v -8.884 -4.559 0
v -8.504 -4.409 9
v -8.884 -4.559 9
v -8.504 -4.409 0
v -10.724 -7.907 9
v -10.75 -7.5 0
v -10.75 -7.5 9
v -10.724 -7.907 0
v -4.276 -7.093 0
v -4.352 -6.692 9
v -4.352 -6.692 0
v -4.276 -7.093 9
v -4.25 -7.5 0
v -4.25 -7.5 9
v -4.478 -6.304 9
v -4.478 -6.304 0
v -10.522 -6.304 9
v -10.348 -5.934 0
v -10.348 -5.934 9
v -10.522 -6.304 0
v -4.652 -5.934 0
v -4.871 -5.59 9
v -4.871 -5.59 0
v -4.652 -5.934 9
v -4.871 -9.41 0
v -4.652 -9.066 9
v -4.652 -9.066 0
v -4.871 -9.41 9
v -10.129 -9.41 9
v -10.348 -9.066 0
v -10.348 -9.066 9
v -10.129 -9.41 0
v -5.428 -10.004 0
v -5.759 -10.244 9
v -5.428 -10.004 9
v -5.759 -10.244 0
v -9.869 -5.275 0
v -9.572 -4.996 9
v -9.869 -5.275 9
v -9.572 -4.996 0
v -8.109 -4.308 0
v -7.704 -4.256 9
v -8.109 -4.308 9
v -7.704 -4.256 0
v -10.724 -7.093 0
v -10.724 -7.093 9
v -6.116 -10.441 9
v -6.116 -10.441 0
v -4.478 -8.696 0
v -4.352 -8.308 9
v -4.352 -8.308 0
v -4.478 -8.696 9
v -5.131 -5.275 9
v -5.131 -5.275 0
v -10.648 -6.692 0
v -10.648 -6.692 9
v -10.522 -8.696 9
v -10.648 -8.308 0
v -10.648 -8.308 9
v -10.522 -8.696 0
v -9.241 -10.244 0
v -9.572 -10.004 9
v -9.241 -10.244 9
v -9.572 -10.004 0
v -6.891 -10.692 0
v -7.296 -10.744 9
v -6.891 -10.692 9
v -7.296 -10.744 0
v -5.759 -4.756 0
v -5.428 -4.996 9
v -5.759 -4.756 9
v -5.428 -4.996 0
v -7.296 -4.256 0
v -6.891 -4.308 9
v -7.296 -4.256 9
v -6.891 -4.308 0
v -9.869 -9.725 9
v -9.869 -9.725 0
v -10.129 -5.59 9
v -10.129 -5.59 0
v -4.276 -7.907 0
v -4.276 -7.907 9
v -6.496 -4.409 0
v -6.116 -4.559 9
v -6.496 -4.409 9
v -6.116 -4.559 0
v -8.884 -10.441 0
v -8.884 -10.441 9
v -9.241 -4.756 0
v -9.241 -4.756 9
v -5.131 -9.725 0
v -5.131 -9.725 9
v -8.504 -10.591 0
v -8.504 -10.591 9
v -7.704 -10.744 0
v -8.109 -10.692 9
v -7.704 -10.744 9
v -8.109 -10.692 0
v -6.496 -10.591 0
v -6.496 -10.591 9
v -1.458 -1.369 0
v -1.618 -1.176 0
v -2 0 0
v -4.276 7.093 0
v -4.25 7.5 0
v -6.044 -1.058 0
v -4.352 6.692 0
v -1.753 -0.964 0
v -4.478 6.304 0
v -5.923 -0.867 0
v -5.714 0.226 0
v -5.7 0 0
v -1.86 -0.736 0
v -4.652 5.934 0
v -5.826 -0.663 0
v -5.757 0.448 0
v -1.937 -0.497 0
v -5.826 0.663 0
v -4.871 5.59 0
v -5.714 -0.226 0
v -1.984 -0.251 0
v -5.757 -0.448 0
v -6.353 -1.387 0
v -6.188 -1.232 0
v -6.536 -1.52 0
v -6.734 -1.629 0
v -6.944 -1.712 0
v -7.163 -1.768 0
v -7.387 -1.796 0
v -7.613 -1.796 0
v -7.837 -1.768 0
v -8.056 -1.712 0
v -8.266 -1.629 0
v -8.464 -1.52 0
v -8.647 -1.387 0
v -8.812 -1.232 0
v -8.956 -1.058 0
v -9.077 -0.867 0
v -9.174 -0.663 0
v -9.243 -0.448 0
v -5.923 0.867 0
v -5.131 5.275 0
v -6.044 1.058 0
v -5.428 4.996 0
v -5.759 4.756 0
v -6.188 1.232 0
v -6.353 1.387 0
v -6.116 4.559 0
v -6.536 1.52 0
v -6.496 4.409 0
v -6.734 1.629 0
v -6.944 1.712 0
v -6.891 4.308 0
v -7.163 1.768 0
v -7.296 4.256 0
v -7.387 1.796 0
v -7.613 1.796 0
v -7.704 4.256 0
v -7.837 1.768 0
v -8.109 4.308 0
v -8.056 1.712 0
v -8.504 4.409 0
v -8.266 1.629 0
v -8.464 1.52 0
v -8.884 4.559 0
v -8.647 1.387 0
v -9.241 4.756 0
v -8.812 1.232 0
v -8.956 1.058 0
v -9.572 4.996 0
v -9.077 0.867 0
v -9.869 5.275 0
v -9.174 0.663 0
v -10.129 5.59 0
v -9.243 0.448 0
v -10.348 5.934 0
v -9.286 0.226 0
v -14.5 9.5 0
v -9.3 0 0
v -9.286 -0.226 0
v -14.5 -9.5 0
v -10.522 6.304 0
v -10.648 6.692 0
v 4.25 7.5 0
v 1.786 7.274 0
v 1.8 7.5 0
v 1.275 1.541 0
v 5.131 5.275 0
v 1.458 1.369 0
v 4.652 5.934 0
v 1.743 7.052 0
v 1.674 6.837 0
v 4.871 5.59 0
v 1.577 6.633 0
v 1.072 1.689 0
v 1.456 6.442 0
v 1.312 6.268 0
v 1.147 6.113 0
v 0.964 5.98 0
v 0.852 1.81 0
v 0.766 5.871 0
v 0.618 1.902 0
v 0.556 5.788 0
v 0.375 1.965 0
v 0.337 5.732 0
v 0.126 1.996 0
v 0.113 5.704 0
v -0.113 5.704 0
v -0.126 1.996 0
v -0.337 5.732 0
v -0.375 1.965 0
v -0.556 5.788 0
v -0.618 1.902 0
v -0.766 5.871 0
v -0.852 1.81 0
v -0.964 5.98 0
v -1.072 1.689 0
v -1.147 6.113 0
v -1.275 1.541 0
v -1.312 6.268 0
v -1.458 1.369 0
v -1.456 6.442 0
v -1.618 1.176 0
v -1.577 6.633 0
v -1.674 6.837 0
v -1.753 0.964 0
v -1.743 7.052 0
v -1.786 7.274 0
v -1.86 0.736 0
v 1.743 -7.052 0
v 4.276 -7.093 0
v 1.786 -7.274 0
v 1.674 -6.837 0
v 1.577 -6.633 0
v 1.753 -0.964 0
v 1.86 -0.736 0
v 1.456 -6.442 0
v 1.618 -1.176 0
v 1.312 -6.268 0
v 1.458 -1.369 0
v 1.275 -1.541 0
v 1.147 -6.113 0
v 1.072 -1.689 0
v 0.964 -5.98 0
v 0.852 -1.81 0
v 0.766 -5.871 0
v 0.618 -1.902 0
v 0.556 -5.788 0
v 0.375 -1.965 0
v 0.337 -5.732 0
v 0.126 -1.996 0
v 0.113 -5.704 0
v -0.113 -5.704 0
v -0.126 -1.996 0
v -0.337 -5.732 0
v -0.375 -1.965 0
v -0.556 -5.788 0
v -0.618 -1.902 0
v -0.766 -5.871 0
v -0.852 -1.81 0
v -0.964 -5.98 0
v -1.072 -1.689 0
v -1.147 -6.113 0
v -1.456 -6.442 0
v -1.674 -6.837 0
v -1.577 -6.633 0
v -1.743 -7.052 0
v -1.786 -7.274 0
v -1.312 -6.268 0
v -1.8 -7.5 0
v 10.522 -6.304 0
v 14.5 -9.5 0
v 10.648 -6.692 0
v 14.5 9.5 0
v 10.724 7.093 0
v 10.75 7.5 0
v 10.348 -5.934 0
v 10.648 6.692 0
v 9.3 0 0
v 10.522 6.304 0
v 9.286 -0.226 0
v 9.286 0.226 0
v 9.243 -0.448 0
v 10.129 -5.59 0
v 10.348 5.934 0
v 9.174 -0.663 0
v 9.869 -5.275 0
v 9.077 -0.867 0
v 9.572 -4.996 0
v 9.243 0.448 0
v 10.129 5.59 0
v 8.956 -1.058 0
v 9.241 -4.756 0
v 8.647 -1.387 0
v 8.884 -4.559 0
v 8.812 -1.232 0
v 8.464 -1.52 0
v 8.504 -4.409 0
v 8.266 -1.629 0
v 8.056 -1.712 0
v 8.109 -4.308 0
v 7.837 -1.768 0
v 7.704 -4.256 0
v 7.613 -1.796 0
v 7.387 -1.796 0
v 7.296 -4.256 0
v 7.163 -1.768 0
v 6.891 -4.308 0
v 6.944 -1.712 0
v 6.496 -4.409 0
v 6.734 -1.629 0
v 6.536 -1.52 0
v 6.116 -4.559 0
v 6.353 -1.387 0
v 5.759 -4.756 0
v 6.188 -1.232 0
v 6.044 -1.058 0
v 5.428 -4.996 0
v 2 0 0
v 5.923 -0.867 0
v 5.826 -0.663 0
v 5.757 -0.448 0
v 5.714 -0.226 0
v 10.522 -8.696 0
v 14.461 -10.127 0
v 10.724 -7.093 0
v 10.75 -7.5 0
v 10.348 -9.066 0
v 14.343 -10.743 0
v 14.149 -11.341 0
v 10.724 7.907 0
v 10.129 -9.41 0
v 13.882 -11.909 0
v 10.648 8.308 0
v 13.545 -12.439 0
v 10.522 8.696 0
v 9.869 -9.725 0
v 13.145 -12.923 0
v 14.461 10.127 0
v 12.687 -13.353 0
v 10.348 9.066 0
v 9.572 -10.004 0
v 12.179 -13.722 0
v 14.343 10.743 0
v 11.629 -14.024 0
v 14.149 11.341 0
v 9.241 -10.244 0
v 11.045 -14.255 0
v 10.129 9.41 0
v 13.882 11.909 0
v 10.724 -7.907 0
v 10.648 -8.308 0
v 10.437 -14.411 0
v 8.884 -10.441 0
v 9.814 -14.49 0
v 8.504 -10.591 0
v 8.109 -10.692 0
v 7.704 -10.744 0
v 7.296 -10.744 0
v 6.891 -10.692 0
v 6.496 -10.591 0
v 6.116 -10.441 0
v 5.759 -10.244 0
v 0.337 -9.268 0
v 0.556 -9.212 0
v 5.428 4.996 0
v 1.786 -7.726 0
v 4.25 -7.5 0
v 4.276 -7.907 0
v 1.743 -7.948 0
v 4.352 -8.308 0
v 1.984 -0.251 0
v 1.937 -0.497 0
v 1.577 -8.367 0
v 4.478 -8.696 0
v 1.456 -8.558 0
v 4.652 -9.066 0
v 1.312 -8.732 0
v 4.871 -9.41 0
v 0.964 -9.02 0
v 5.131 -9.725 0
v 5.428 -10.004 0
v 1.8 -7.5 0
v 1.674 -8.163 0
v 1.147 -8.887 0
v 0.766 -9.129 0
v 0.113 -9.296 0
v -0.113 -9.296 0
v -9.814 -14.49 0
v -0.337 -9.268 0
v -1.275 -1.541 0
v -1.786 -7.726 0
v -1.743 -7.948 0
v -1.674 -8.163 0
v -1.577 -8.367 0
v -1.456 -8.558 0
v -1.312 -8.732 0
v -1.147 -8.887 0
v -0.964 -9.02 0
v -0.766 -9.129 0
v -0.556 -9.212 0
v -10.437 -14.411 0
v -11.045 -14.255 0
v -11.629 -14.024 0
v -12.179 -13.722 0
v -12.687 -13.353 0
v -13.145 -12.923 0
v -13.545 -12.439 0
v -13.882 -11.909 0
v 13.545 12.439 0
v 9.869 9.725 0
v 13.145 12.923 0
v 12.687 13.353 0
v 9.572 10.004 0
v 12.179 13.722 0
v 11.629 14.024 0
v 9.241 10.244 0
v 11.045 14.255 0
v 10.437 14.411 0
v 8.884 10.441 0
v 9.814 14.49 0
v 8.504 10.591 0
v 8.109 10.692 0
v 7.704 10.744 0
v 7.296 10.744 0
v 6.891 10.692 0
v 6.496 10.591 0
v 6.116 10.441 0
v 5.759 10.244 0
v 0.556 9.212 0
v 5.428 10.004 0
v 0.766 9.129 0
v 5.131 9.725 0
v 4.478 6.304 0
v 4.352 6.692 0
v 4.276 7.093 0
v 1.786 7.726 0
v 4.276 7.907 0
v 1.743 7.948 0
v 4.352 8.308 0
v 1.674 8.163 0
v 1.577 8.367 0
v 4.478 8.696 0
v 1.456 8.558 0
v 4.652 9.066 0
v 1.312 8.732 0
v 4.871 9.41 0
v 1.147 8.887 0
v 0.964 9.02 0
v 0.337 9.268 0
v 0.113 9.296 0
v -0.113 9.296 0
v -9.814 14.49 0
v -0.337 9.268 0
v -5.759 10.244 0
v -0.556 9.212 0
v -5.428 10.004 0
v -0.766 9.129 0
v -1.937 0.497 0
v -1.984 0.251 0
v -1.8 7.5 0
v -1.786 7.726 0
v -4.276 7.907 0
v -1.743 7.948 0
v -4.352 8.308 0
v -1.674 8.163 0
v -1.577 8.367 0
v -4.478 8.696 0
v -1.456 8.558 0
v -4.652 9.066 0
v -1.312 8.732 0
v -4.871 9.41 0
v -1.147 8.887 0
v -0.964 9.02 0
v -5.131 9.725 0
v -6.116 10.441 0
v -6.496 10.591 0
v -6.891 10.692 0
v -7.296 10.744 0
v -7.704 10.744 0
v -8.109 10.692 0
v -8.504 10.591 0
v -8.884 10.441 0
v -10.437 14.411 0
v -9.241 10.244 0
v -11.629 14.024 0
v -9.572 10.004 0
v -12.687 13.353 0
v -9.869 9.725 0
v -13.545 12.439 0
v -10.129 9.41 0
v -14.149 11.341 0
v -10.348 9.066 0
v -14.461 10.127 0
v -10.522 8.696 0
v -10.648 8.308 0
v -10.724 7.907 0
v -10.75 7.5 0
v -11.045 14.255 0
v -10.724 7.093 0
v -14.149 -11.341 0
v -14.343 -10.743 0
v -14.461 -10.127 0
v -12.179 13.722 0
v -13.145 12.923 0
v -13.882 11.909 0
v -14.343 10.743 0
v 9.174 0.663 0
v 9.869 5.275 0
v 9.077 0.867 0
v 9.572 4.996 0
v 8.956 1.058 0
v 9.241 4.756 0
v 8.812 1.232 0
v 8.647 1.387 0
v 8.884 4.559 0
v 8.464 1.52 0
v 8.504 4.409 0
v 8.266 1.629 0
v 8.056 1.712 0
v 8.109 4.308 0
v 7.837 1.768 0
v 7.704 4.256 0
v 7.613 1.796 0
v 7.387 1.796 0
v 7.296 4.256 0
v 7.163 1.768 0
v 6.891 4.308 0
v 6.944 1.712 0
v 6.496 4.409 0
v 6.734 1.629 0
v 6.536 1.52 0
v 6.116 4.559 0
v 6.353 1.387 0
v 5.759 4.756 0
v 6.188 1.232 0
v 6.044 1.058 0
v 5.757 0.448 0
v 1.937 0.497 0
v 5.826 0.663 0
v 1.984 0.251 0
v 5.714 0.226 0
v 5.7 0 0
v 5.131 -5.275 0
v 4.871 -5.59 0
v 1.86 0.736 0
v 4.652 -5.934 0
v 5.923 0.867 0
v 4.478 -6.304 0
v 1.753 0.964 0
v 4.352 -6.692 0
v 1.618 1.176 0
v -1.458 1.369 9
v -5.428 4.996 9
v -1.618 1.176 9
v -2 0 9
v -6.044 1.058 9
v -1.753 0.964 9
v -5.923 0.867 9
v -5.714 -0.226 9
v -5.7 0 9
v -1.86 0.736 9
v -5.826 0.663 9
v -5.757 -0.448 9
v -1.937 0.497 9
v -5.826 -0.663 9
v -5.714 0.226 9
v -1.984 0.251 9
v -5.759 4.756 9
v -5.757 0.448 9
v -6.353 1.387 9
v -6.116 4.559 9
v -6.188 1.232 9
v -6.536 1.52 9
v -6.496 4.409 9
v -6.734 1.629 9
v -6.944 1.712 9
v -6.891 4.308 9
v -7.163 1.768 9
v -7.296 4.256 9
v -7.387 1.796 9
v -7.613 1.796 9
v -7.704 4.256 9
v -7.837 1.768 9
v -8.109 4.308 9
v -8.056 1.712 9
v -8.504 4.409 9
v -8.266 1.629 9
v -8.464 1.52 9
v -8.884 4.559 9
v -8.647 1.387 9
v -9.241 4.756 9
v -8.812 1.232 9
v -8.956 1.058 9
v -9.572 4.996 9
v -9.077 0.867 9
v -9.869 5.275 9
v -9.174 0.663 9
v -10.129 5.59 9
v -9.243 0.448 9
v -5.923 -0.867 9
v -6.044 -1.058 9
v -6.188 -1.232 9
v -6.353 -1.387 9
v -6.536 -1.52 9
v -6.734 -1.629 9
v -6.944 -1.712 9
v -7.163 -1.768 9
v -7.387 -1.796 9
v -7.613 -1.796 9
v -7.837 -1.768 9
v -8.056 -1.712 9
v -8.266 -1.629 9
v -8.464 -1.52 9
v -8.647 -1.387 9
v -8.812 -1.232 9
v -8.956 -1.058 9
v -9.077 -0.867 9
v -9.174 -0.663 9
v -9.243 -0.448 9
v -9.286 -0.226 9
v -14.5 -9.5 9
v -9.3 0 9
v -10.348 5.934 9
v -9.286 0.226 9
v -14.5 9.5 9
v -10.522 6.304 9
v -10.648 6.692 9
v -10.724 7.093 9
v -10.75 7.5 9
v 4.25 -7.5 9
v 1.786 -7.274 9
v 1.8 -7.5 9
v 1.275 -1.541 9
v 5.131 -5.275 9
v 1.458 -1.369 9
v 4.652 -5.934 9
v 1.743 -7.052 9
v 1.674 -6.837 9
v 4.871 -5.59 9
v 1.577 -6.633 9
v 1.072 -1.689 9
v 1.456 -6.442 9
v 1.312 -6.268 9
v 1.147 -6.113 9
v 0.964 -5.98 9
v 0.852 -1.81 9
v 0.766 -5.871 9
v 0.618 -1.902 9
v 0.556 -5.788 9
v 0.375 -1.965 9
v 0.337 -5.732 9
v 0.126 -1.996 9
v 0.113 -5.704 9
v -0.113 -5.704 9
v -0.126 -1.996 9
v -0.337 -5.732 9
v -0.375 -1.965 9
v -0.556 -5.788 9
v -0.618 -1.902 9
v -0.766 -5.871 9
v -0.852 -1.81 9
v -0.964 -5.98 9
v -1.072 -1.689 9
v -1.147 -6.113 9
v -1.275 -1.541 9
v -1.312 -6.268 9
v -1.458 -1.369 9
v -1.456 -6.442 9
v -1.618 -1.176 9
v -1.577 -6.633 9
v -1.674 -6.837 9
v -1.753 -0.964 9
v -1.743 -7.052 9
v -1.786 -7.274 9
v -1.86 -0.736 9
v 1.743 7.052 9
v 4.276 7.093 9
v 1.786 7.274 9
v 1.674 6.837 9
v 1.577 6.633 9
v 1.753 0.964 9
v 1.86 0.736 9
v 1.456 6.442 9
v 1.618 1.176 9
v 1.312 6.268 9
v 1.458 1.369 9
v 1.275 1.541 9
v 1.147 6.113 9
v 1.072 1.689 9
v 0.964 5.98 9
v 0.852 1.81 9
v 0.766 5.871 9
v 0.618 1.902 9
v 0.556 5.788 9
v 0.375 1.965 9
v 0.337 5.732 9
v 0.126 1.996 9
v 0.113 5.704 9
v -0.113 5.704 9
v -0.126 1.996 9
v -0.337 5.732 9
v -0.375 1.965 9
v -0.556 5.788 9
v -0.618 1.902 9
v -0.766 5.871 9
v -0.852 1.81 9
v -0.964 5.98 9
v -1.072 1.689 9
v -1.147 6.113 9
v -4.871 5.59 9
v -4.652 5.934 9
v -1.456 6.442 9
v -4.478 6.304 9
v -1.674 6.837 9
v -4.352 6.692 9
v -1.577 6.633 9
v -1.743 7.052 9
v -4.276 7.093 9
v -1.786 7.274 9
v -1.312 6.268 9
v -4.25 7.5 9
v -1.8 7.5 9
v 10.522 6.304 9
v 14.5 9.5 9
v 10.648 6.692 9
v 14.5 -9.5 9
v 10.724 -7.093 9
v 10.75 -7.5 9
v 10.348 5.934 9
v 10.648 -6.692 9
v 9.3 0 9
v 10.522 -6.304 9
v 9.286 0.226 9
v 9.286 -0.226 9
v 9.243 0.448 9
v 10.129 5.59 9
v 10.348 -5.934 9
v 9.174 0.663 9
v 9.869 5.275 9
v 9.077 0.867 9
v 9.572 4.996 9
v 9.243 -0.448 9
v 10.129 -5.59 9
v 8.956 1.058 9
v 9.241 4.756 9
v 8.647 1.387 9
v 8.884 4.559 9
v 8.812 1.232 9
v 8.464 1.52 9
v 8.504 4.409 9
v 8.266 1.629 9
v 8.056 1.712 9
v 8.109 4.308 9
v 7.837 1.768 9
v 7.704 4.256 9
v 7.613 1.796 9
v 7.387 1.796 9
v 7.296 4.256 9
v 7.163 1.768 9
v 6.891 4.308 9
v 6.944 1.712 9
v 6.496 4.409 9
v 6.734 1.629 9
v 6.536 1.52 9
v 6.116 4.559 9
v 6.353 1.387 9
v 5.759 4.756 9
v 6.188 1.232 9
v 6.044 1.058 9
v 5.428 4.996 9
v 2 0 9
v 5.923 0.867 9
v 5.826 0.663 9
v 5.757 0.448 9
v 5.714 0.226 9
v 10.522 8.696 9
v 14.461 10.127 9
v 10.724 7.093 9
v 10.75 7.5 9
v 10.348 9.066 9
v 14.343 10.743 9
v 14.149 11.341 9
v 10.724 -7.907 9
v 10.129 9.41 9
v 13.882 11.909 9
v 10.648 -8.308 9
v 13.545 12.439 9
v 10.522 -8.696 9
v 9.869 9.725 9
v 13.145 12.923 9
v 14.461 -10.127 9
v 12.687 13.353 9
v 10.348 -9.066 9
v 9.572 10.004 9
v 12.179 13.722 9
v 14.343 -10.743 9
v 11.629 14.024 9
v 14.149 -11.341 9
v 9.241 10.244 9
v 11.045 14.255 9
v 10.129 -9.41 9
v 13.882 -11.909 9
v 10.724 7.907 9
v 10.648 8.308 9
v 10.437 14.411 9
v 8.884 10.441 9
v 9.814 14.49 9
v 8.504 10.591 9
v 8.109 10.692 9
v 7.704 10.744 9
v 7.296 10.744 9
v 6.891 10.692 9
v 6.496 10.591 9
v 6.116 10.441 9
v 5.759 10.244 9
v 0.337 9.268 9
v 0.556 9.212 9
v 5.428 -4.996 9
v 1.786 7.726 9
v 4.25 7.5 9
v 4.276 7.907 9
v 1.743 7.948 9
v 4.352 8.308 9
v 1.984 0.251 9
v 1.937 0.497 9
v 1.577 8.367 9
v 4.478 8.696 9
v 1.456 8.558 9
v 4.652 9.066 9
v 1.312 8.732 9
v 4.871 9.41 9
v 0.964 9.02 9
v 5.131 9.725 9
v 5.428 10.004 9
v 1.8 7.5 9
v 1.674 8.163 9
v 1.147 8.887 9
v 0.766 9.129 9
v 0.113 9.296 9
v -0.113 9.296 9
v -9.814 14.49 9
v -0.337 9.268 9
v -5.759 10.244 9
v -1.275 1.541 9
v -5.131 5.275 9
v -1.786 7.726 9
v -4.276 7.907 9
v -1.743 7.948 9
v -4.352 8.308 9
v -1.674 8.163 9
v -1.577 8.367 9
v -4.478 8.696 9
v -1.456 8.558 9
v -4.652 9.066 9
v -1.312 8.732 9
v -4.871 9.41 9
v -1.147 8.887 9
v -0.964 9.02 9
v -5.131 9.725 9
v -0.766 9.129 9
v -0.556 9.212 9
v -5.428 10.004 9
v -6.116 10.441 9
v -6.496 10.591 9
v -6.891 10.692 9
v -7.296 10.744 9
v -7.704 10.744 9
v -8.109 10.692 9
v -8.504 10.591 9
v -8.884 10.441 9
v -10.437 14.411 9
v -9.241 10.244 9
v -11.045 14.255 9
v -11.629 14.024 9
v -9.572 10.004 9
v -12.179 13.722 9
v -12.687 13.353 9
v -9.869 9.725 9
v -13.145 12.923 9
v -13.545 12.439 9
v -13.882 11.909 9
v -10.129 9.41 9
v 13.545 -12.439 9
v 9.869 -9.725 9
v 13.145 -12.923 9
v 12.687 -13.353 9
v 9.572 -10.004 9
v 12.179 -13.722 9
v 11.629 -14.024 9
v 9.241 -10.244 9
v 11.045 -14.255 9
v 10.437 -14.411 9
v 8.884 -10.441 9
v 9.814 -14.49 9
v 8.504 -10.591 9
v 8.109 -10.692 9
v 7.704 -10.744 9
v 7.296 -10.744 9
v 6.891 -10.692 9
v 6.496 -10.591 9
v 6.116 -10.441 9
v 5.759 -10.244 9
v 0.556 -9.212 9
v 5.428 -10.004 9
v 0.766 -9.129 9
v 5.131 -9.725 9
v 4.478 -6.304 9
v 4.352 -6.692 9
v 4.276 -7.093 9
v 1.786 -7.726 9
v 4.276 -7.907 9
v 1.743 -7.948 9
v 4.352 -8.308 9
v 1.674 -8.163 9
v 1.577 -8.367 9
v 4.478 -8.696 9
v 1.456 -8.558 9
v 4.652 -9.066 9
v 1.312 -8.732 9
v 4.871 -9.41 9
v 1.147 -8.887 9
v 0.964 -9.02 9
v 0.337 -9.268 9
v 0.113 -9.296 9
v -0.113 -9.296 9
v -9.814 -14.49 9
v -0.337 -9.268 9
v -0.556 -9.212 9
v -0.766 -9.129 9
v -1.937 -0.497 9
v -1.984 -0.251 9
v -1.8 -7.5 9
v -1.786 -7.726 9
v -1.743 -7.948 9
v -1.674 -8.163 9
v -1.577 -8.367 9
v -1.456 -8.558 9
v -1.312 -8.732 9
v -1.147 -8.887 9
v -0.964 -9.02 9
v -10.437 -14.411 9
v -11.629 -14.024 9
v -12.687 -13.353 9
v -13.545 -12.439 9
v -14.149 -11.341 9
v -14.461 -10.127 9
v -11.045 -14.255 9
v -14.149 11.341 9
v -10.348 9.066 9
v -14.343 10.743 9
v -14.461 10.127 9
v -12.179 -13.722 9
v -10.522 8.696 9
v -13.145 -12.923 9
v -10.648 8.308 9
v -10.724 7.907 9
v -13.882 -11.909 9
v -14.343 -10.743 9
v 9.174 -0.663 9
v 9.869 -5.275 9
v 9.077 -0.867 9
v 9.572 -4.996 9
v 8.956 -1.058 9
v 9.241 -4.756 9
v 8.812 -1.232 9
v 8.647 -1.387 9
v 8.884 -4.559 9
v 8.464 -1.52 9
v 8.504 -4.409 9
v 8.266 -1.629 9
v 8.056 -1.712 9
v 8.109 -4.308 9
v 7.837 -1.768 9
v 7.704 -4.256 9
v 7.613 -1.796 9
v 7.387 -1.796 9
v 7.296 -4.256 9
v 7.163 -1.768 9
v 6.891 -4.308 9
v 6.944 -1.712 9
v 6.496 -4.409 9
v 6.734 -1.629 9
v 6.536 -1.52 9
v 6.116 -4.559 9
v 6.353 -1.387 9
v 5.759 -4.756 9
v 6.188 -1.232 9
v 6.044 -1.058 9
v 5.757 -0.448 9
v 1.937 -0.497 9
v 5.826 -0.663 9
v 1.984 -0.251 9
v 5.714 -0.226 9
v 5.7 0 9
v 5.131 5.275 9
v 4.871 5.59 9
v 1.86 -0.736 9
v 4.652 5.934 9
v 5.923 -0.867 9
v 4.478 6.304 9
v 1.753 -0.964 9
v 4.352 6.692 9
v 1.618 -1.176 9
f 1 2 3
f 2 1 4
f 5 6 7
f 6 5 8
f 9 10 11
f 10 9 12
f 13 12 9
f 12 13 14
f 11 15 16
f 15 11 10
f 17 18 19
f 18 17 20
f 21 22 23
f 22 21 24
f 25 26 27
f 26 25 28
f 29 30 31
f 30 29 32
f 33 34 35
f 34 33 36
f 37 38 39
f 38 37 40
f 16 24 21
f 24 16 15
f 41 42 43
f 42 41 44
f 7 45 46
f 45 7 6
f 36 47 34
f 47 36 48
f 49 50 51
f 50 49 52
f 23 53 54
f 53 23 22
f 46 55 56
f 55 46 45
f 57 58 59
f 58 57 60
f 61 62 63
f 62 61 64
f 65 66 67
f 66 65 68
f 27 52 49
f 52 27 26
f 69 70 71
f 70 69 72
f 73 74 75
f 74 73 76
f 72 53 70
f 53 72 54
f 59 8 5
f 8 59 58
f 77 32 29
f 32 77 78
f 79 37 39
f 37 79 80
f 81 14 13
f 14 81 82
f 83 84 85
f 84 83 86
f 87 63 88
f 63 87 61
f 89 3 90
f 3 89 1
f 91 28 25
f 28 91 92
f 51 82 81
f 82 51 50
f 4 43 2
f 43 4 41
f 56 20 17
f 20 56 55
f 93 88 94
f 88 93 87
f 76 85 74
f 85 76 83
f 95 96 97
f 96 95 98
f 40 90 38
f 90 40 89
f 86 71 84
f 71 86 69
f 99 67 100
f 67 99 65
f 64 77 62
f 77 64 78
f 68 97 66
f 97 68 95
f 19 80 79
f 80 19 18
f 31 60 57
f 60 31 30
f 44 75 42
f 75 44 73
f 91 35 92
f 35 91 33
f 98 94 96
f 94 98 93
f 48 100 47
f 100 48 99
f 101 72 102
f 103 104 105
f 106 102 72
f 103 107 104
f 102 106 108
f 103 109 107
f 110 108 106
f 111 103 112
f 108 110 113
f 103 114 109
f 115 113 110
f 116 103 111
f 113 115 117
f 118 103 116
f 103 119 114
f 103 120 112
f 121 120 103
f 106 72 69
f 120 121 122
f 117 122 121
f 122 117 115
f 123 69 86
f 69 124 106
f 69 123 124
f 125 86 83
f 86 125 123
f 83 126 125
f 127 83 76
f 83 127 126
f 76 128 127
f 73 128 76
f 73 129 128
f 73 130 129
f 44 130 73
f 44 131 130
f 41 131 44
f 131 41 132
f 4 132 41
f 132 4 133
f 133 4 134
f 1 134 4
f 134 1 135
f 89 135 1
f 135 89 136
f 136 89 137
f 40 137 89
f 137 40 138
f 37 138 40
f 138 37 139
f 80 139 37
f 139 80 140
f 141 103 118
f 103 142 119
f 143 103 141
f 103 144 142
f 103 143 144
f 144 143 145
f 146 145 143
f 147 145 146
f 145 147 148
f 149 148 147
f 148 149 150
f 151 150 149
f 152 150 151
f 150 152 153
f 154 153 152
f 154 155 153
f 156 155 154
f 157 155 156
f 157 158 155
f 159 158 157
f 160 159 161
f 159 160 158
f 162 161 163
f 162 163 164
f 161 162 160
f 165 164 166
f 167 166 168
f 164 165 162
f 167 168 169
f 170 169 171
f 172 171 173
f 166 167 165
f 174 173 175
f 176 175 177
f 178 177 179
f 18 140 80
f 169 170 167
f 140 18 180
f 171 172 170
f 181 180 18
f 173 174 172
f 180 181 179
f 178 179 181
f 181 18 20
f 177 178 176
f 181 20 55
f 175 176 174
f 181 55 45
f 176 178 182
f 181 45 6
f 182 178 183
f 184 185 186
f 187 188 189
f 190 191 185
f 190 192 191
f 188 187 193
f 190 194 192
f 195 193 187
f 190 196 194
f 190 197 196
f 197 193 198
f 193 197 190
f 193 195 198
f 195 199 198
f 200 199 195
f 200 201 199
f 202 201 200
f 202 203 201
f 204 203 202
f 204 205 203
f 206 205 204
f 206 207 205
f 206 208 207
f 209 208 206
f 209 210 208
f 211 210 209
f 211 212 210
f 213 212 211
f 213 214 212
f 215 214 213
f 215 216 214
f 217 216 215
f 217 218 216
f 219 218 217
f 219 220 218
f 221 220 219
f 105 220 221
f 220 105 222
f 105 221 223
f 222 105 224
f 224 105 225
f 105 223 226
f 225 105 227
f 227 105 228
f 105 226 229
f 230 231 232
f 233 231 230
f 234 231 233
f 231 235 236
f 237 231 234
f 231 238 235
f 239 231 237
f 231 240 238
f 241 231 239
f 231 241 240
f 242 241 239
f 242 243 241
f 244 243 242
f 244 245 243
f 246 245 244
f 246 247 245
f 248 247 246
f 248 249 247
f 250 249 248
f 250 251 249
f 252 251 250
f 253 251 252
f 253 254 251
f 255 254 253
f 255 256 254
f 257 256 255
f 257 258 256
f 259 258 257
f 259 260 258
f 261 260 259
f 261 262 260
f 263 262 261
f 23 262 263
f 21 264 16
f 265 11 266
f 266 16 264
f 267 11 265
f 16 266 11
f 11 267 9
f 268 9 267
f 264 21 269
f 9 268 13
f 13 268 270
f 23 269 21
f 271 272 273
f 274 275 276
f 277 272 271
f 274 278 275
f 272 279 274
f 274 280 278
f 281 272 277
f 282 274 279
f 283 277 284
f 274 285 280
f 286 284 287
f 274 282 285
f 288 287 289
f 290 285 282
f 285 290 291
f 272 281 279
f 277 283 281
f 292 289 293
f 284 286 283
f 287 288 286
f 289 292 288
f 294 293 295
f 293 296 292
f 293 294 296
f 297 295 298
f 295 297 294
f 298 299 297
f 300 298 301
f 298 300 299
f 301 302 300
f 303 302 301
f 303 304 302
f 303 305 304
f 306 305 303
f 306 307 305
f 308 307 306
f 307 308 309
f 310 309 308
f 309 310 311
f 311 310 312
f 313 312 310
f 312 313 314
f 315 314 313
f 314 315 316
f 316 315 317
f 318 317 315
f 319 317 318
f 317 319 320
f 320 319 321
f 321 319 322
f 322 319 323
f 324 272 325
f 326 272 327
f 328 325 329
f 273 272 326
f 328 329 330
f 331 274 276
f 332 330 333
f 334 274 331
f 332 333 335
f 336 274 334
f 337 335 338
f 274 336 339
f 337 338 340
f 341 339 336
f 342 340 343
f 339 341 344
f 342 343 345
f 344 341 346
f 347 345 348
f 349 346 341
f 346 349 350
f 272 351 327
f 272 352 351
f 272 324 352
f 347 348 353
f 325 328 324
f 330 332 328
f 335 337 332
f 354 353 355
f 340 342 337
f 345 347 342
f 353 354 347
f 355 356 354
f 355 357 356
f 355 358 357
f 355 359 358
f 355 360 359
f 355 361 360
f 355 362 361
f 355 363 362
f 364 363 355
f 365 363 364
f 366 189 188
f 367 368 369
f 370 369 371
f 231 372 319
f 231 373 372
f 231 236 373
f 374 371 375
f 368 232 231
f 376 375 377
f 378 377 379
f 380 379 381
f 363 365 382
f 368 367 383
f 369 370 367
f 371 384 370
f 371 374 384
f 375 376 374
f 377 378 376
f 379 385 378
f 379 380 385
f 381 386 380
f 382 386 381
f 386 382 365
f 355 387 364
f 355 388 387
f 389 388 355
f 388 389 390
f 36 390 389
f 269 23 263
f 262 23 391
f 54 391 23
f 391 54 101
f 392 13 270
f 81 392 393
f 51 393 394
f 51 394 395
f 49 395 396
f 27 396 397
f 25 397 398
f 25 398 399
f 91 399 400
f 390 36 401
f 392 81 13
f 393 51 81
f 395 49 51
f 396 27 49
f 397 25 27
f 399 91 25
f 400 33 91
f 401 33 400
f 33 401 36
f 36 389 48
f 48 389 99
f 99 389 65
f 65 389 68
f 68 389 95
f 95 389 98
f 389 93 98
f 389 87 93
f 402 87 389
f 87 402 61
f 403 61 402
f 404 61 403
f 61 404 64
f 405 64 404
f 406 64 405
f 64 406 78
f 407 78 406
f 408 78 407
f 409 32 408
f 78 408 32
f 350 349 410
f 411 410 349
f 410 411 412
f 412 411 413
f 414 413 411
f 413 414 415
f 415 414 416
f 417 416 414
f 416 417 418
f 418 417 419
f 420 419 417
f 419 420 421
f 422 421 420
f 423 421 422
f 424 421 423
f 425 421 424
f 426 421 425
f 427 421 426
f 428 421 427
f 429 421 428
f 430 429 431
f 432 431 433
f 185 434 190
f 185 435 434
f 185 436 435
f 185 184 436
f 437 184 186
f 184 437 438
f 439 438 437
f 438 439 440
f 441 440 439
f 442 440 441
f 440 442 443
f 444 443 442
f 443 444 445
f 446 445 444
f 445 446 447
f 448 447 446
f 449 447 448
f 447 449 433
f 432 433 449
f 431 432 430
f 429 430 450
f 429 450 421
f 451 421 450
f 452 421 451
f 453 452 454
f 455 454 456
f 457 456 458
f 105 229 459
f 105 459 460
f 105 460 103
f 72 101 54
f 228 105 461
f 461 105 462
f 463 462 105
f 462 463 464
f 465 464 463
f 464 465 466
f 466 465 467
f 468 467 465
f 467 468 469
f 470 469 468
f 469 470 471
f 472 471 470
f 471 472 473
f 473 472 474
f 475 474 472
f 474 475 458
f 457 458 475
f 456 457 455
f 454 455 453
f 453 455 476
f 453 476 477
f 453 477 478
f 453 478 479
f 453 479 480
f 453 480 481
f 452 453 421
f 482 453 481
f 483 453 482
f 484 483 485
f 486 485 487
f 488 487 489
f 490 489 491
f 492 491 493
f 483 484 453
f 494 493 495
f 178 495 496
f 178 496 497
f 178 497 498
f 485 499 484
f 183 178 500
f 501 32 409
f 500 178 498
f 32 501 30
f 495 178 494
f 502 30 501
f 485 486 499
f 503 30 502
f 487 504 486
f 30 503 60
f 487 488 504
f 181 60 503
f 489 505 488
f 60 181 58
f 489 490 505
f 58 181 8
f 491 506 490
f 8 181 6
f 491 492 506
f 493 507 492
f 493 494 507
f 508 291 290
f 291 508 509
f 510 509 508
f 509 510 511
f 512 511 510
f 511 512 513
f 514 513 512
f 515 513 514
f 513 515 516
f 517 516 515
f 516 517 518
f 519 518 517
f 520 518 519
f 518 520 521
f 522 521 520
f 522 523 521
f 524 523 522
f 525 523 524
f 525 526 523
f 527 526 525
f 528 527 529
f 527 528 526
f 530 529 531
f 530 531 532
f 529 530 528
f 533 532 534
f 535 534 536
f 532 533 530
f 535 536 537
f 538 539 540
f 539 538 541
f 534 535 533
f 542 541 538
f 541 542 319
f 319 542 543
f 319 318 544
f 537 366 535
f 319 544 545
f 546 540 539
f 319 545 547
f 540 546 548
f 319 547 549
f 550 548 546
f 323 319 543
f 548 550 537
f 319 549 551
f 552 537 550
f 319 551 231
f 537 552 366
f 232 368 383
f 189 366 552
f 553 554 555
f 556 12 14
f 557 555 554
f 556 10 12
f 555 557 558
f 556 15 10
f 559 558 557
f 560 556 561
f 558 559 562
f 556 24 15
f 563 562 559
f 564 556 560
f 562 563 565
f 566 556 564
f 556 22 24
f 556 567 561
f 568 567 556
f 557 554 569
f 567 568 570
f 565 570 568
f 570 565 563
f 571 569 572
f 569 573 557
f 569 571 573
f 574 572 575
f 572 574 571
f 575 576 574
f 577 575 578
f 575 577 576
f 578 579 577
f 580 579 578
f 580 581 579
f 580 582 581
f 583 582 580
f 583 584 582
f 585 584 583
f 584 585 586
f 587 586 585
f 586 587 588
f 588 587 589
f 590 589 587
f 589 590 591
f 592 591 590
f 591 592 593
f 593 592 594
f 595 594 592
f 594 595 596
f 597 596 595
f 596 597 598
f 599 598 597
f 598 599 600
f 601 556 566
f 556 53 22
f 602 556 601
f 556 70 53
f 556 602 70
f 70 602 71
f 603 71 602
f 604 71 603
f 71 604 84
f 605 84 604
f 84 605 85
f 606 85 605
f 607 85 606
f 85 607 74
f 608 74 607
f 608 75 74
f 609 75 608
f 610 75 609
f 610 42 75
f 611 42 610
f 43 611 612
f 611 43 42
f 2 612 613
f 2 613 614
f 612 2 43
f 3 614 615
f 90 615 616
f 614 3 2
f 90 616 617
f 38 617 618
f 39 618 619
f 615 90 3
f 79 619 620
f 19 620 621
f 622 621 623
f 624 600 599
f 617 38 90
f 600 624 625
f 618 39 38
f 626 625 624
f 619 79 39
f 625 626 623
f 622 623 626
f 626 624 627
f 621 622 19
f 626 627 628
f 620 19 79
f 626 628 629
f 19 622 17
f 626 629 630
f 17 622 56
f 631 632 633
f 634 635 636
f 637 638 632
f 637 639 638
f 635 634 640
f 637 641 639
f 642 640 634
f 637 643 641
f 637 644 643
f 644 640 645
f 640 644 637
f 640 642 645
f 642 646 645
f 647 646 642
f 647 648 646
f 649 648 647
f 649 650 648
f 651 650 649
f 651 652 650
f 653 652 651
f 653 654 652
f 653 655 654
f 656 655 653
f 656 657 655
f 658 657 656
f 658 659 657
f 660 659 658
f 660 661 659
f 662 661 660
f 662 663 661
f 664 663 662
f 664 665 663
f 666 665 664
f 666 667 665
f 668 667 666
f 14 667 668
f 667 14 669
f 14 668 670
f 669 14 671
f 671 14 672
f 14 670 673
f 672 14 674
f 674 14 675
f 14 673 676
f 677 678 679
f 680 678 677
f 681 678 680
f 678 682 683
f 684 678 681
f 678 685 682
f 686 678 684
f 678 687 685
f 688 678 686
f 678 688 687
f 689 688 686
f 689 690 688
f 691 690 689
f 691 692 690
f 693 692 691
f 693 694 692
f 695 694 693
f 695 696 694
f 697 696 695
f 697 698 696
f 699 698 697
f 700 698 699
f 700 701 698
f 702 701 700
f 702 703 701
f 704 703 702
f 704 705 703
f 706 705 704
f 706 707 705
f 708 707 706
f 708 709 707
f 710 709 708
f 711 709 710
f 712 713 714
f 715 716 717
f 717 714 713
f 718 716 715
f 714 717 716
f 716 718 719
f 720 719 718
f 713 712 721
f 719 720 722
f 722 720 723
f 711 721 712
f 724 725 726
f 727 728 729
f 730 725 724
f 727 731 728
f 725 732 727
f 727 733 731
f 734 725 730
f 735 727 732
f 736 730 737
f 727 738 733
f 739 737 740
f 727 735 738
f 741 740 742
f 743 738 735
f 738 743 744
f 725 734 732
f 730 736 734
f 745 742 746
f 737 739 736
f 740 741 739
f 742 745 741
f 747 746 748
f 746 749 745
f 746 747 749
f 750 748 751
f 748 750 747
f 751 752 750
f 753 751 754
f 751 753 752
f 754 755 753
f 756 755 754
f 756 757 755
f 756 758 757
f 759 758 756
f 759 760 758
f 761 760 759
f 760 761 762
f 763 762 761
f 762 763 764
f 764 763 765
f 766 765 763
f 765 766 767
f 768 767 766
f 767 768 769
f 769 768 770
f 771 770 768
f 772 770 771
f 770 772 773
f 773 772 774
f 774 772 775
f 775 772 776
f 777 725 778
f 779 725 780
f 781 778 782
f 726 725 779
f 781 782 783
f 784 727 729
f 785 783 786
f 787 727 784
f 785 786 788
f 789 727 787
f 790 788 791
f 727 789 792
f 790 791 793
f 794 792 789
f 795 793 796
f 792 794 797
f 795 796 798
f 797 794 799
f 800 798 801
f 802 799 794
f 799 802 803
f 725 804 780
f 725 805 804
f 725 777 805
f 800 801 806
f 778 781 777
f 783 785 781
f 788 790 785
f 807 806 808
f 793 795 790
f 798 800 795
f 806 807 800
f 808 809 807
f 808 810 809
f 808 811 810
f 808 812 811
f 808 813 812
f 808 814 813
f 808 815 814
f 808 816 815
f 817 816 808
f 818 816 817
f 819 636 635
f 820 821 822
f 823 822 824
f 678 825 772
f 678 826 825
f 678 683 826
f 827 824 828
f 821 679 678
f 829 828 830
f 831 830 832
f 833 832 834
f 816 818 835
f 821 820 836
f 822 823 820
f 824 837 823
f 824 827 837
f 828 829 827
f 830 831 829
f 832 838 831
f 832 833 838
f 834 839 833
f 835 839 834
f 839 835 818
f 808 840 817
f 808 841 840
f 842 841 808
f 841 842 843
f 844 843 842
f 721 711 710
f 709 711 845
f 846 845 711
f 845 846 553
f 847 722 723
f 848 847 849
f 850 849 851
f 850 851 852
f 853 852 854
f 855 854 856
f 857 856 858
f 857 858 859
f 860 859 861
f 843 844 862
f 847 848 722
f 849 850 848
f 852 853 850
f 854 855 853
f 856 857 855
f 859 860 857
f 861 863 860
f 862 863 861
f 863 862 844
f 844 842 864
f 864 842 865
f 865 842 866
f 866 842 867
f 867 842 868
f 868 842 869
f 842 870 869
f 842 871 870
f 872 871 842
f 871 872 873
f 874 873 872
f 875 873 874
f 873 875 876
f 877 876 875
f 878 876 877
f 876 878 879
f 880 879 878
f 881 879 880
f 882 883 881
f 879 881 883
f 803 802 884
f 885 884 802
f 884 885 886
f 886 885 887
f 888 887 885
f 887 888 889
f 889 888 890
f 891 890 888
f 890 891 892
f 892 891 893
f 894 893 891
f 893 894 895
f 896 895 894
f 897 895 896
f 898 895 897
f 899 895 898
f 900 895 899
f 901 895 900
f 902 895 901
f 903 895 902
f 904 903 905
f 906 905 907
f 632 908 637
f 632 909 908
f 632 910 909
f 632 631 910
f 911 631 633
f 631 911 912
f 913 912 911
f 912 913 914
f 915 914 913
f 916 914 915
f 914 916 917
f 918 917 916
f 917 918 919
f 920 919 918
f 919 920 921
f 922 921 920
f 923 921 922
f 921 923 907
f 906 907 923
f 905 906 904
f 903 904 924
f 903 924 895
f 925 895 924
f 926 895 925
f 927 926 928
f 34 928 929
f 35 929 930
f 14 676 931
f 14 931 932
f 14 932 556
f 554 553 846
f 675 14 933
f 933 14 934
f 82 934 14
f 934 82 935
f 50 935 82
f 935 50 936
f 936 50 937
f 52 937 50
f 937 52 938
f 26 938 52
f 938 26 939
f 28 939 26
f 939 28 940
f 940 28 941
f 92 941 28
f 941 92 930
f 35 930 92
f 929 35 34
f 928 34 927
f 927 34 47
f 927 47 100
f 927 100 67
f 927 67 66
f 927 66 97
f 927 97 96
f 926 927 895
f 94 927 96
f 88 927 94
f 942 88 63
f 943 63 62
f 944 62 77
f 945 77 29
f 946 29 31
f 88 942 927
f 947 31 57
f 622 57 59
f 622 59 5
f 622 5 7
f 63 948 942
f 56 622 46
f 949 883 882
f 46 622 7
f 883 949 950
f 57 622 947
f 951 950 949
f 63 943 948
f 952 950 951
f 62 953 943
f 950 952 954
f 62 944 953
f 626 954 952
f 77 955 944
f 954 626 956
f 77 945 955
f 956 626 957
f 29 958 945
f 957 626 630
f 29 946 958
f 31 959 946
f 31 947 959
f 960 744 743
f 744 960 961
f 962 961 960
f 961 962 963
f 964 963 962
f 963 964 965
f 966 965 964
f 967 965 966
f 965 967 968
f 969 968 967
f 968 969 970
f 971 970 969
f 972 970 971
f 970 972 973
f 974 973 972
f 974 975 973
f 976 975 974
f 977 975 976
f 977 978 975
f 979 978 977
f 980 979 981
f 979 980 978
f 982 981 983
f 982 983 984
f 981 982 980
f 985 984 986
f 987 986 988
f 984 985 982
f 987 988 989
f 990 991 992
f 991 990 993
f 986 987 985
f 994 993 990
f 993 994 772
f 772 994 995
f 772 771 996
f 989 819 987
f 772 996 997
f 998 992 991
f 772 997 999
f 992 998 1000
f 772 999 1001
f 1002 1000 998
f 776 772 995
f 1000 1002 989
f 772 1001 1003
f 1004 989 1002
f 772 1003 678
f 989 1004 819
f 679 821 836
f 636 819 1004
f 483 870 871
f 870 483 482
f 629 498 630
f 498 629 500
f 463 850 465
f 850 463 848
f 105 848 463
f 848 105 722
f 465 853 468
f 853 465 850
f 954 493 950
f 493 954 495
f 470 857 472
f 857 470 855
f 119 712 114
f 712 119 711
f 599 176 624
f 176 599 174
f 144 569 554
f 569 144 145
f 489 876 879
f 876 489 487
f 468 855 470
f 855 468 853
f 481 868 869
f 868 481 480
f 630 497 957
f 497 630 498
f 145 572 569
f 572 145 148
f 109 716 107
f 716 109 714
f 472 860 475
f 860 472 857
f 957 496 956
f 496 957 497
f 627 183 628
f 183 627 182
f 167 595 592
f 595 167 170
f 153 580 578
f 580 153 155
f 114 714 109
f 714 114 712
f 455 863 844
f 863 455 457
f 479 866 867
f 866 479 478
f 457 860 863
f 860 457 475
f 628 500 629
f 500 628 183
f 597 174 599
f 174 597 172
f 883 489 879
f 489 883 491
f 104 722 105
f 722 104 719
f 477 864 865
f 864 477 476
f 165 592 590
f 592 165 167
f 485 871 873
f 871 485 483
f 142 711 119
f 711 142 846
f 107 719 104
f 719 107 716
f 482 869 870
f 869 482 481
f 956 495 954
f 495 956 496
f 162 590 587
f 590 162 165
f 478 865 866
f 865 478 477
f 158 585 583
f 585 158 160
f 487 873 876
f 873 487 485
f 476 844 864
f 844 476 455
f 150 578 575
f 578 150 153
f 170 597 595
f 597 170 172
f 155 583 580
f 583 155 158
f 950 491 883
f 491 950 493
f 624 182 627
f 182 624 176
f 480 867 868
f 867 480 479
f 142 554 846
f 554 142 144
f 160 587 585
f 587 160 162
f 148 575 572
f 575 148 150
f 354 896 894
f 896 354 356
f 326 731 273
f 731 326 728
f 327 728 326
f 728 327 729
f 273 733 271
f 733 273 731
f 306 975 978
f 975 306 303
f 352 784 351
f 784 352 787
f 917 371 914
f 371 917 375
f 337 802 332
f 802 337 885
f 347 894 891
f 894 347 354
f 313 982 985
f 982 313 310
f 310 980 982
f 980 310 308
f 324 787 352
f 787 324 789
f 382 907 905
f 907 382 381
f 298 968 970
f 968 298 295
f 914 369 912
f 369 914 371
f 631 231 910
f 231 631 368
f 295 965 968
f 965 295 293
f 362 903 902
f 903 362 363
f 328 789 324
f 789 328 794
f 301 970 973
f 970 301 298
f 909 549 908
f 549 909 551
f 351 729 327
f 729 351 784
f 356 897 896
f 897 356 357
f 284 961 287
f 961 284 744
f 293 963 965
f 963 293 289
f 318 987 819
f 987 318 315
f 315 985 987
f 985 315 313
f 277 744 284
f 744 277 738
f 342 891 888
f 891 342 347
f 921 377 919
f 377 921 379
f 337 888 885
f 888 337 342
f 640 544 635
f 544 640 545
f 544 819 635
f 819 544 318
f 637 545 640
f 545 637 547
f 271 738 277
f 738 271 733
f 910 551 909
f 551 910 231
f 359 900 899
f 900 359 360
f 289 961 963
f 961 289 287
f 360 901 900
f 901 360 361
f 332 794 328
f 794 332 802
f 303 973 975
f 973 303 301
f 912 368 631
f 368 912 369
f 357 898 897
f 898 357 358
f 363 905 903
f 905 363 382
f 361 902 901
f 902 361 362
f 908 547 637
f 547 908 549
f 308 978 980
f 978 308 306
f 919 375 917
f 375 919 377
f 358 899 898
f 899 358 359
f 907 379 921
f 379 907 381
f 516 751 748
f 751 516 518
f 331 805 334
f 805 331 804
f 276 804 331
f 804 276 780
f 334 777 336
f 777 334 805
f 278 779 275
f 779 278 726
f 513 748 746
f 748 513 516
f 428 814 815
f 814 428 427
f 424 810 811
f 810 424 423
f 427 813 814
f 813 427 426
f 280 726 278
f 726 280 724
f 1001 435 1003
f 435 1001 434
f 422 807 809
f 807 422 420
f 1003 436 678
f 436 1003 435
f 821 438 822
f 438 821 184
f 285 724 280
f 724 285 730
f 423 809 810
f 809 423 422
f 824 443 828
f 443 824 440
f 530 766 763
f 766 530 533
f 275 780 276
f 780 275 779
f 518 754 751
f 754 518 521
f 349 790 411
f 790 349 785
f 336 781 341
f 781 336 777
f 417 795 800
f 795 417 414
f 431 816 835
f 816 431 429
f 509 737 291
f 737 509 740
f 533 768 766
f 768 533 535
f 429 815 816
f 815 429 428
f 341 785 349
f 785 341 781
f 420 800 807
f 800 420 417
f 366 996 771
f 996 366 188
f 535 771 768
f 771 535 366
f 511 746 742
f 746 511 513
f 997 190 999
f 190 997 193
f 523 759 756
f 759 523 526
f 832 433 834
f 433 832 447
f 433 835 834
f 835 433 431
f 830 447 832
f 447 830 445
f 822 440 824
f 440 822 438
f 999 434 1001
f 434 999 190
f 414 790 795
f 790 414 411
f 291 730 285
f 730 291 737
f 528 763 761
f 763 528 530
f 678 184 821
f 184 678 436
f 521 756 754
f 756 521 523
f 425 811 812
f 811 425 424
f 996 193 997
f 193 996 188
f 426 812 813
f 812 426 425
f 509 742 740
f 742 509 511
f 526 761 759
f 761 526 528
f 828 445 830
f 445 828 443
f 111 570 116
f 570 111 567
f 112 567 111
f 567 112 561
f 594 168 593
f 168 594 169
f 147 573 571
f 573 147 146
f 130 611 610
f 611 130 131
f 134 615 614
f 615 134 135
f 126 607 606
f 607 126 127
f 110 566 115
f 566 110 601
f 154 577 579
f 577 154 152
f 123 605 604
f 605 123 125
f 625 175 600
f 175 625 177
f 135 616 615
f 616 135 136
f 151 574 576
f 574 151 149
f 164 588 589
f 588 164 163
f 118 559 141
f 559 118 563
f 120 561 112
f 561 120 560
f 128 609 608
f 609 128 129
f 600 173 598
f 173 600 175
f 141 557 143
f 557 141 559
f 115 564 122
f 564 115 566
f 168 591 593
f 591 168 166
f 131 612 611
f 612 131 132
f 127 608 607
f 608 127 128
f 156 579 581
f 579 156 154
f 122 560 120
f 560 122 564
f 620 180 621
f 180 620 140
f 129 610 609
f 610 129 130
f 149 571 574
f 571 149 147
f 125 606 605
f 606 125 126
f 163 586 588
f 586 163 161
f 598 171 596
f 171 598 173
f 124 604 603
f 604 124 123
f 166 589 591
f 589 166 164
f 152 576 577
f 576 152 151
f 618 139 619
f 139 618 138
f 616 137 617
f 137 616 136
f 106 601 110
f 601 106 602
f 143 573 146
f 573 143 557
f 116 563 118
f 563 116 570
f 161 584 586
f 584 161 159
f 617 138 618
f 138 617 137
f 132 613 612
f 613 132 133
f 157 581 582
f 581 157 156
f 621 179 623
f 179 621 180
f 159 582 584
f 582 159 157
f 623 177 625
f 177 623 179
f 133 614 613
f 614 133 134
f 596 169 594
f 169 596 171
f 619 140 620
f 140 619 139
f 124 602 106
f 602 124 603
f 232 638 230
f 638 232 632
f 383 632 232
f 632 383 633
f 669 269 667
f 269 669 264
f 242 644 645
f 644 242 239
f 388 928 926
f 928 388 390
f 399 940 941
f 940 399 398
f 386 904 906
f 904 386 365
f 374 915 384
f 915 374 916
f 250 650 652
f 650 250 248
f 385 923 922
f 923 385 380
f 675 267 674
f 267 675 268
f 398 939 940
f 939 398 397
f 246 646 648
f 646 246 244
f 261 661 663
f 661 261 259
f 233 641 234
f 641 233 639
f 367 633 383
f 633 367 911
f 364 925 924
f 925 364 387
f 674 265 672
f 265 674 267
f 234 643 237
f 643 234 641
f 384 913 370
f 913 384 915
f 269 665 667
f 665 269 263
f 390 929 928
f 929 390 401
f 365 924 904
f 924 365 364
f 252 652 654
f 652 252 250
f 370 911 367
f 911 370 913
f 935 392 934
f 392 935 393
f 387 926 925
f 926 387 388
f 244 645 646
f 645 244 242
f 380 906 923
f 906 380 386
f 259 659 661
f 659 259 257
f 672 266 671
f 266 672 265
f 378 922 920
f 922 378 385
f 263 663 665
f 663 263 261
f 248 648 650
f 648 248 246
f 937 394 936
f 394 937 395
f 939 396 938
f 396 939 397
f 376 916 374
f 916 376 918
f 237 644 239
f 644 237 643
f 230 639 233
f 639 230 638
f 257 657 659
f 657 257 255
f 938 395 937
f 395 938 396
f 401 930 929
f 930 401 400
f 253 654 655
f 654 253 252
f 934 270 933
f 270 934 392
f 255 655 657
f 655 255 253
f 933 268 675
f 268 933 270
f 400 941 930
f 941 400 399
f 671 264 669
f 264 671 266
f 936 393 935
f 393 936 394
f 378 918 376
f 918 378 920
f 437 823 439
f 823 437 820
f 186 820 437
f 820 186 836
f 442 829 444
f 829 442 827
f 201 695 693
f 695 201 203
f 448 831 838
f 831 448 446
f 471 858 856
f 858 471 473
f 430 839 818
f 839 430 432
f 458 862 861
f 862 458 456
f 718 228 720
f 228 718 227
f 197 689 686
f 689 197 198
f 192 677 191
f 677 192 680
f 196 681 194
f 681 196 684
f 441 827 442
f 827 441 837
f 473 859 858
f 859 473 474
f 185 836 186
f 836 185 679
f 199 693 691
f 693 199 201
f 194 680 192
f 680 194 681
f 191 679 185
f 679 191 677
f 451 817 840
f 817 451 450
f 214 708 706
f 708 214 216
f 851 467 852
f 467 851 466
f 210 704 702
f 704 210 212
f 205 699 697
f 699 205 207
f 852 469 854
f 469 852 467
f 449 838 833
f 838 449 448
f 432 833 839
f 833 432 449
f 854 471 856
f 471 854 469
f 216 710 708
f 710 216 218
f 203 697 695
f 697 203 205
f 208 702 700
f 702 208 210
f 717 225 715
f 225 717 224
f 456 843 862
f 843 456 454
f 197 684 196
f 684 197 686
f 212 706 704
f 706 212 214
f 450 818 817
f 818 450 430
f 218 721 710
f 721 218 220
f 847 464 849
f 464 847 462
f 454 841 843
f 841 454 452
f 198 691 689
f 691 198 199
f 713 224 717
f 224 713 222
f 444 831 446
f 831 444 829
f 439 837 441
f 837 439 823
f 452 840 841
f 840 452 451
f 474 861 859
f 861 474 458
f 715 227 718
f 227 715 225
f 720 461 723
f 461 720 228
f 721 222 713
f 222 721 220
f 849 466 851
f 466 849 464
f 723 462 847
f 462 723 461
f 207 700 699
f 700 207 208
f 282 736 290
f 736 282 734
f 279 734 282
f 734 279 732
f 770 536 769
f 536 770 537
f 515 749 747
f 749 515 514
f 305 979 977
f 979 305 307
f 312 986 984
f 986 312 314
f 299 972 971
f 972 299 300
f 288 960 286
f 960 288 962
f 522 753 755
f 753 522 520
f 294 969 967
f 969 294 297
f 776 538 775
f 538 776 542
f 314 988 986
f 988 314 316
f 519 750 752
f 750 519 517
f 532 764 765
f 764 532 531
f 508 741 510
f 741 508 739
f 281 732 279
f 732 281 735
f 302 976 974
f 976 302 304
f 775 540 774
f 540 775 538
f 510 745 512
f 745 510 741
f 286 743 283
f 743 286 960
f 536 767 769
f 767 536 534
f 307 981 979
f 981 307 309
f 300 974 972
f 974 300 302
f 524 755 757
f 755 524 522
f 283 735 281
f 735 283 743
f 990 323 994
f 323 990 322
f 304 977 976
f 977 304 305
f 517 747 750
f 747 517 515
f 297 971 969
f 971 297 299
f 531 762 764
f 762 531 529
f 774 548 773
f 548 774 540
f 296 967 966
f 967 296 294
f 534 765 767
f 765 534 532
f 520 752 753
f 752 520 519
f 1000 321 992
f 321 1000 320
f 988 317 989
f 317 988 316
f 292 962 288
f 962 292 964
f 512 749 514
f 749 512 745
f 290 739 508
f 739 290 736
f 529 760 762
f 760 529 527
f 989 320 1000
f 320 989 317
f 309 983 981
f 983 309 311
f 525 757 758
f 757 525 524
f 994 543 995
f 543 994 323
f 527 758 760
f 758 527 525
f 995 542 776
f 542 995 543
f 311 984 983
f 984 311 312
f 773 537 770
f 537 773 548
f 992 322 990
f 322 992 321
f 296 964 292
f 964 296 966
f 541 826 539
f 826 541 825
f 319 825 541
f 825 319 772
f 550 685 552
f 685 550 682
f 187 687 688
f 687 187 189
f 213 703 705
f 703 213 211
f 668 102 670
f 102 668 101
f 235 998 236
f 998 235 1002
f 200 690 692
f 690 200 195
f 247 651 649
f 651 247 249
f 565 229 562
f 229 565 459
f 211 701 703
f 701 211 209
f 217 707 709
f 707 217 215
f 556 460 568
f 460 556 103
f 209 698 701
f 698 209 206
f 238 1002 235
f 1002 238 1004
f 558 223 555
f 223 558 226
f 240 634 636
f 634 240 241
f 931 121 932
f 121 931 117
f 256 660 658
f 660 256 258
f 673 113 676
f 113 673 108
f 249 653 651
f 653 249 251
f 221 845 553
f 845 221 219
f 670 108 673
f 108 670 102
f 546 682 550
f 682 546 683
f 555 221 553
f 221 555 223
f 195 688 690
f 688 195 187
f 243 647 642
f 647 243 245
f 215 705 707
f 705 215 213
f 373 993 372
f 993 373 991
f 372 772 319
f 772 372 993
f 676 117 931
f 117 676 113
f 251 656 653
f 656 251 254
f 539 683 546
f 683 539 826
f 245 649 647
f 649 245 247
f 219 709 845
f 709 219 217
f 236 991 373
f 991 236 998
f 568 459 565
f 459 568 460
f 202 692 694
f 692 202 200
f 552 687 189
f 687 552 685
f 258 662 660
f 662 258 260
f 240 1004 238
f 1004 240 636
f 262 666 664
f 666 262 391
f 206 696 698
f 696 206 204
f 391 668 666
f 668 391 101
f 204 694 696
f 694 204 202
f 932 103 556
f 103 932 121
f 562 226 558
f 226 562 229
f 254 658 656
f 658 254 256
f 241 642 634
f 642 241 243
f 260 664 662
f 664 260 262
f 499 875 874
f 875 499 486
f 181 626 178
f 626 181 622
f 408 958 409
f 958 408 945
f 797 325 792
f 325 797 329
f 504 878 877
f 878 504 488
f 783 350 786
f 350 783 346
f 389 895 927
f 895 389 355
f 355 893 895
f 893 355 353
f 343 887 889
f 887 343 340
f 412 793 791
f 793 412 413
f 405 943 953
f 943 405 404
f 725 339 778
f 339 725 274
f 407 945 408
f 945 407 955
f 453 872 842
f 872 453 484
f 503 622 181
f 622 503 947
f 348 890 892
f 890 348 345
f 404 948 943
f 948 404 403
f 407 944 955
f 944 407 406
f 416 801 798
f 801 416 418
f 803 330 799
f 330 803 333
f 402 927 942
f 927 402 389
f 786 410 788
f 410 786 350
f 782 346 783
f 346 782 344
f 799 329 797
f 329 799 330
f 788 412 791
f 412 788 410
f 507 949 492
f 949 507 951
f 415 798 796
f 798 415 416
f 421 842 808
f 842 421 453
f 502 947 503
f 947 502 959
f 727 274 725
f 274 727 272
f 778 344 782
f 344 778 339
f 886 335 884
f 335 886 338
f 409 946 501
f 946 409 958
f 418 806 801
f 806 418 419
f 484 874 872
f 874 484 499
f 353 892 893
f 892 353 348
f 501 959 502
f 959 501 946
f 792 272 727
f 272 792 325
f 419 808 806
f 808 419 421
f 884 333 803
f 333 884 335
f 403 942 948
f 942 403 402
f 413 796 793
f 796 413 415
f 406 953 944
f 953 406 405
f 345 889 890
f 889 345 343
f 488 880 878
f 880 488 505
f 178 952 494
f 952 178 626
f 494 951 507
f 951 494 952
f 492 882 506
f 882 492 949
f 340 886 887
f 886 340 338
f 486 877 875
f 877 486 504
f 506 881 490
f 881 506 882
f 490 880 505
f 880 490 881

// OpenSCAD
$fn = 50;

difference() {
	union() {
		hull() {
			translate(v = [-9.5, 9.5, 0]) {
				cylinder(h = 9, r = 5);
			}
			translate(v = [9.5, 9.5, 0]) {
				cylinder(h = 9, r = 5);
			}
			translate(v = [-9.5, -9.5, 0]) {
				cylinder(h = 9, r = 5);
			}
			translate(v = [9.5, -9.5, 0]) {
				cylinder(h = 9, r = 5);
			}
		}
	}
	union() {
		translate(v = [-7.5, -7.5, 0]) {
			cylinder(h = 9, r = 3.25);
		}
		translate(v = [-7.5, 7.5, 0]) {
			cylinder(h = 9, r = 3.25);
		}
		translate(v = [7.5, -7.5, 0]) {
			cylinder(h = 9, r = 3.25);
		}
		translate(v = [7.5, 7.5, 0]) {
			cylinder(h = 9, r = 3.25);
		}
		translate(v = [-7.5, 0.0, 0]) {
			cylinder(h = 9, r = 1.8);
		}
		translate(v = [0.0, -7.5, 0]) {
			cylinder(h = 9, r = 1.8);
		}
		translate(v = [0.0, 7.5, 0]) {
			cylinder(h = 9, r = 1.8);
		}
		translate(v = [7.5, 0.0, 0]) {
			cylinder(h = 9, r = 1.8);
		}
		cylinder(h = 9, r = 2.0);
	}
}
